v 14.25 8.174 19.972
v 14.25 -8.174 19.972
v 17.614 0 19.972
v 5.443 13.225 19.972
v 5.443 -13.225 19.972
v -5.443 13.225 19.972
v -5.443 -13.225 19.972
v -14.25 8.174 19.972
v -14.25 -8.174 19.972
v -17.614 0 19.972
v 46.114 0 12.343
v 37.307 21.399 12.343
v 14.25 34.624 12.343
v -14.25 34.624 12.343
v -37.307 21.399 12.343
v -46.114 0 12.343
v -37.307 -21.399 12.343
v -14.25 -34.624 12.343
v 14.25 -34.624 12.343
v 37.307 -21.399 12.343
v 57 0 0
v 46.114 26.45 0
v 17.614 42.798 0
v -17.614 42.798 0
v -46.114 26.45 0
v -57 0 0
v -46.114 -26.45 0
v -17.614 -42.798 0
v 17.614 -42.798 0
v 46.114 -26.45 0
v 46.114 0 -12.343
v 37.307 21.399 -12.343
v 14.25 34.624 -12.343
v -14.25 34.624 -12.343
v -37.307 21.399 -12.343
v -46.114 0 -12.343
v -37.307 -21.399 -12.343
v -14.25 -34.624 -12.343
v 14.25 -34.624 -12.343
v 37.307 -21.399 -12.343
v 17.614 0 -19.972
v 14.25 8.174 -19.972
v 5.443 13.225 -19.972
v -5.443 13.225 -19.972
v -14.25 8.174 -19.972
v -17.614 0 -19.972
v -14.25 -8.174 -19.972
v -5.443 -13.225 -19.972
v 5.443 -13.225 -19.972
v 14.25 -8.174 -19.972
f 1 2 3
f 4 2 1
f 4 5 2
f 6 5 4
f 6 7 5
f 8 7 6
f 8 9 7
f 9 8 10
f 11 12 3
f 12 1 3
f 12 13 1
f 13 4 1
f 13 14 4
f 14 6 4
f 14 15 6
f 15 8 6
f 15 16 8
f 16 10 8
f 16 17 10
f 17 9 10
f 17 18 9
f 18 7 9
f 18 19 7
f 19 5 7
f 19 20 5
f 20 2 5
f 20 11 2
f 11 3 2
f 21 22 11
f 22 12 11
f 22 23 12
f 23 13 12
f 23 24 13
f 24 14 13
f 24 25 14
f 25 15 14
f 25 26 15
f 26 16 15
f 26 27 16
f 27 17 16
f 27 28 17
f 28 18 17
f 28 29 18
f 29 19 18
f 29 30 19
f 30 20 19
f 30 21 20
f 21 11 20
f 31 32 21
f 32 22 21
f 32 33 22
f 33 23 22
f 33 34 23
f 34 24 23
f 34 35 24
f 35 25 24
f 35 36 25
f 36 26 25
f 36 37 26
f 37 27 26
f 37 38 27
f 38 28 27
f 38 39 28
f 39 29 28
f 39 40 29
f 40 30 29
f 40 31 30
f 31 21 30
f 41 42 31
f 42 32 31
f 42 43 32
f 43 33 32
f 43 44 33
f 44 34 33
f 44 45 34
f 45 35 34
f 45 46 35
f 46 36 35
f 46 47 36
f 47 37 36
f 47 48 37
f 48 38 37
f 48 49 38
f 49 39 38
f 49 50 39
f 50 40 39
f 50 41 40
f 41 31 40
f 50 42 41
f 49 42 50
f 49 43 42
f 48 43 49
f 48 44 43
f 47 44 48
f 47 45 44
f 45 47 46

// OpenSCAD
// Generated by SolidPython 1.0.1 on 2020-07-29 00:46:54


scale(v = [19, 15, 7]) {
	sphere(r = 3);
}
/***********************************************
*********      SolidPython code:      **********
************************************************
 
# import packages: SolidPython
from solid import *
from solid.utils import *
from itertools import chain, combinations, permutations


class Resize:

    def __init__(self, scad_file):
        self.scad_file = scad_file
        #self.scad_file = import_scad(scad_file)
        # cone/cylinder param:
        self.r1 = 0
        self.r2 = 0
        self.h = 0
        # rectangular prism param:
        self.w = 0
        self.l = 0
        # ellipse param:
        self.r = 0

    # import OpenScad code (file name corresponds to shape)


    # classify shape + parameters
    def assign(self, param1, param2, param3):
        if self.scad_file == 'cone.scad':
            self.r1 = param1
            self.r2 = param2
            self.h = param3
        elif self.scad_file == 'cylinder.scad':
            self.r1 = param1
            self.r2 = param2
            self.h = param3
        elif self.scad_file == 'rectangularPrism.scad':
            self.h = param1
            self.l = param2
            self.w = param3
        else:
            self.r = param1
            self.h = param2

    # resize parameters
    def iterate(self):
        x = range(3, 20, 2)
        i = 1
        if self.scad_file == 'cone.scad':
            tempList = list(permutations(x, 2))
            for temp in tempList:
                param1 = temp[0]
                param2 = temp[1]
                filepath = 'produced_scad_files/' + 'cone' + str(param1) + '_' + str(param2) + '_' + '.scad'
                scad_render_to_file(cylinder(h=param1, r1=param2, r2=0), filepath)

        elif self.scad_file == 'cylinder.scad':
            tempList = list(permutations(x, 3))
            for temp in tempList:
                param1 = temp[0]
                param2 = temp[1]
                filepath = 'produced_scad_files/' + 'cylinder' + str(param1) + '_' + str(param2) + '_' + '.scad'
                scad_render_to_file(cylinder(h=param1, r1=param2, r2=param2), filepath)

        elif self.scad_file == 'rectangularPrism.scad':
            tempList = list(permutations(x, 3))
            for temp in tempList:
                param1 = temp[0]
                param2 = temp[1]
                param3 = temp[2]
                filepath = 'produced_scad_files/' + 'rectangularPrism' + str(param1) + '_' + str(param2) + '_' + str(
                    param3) + '.scad'
                scad_render_to_file(cube(size=(param1, param2, param3)), filepath)

        elif self.scad_file == 'ellipse.scad':
            tempList = list(permutations(x, 4))
            for temp in tempList:
                param1 = temp[0]
                param2 = temp[1]
                param3 = temp[2]
                param4 = temp[3]
                filepath = 'produced_scad_files/' + 'ellipse' + str(param1) + '_' + str(param2) + '_' + str(param3) + '_' + str(param4) + '.scad'
                scad_render_to_file(scale([param1, param2, param3])(sphere(r=param4)), filepath)

    def render_to_scadfile(self):
        scad_render_to_file(scad, 'example.scad') 
 
************************************************/
